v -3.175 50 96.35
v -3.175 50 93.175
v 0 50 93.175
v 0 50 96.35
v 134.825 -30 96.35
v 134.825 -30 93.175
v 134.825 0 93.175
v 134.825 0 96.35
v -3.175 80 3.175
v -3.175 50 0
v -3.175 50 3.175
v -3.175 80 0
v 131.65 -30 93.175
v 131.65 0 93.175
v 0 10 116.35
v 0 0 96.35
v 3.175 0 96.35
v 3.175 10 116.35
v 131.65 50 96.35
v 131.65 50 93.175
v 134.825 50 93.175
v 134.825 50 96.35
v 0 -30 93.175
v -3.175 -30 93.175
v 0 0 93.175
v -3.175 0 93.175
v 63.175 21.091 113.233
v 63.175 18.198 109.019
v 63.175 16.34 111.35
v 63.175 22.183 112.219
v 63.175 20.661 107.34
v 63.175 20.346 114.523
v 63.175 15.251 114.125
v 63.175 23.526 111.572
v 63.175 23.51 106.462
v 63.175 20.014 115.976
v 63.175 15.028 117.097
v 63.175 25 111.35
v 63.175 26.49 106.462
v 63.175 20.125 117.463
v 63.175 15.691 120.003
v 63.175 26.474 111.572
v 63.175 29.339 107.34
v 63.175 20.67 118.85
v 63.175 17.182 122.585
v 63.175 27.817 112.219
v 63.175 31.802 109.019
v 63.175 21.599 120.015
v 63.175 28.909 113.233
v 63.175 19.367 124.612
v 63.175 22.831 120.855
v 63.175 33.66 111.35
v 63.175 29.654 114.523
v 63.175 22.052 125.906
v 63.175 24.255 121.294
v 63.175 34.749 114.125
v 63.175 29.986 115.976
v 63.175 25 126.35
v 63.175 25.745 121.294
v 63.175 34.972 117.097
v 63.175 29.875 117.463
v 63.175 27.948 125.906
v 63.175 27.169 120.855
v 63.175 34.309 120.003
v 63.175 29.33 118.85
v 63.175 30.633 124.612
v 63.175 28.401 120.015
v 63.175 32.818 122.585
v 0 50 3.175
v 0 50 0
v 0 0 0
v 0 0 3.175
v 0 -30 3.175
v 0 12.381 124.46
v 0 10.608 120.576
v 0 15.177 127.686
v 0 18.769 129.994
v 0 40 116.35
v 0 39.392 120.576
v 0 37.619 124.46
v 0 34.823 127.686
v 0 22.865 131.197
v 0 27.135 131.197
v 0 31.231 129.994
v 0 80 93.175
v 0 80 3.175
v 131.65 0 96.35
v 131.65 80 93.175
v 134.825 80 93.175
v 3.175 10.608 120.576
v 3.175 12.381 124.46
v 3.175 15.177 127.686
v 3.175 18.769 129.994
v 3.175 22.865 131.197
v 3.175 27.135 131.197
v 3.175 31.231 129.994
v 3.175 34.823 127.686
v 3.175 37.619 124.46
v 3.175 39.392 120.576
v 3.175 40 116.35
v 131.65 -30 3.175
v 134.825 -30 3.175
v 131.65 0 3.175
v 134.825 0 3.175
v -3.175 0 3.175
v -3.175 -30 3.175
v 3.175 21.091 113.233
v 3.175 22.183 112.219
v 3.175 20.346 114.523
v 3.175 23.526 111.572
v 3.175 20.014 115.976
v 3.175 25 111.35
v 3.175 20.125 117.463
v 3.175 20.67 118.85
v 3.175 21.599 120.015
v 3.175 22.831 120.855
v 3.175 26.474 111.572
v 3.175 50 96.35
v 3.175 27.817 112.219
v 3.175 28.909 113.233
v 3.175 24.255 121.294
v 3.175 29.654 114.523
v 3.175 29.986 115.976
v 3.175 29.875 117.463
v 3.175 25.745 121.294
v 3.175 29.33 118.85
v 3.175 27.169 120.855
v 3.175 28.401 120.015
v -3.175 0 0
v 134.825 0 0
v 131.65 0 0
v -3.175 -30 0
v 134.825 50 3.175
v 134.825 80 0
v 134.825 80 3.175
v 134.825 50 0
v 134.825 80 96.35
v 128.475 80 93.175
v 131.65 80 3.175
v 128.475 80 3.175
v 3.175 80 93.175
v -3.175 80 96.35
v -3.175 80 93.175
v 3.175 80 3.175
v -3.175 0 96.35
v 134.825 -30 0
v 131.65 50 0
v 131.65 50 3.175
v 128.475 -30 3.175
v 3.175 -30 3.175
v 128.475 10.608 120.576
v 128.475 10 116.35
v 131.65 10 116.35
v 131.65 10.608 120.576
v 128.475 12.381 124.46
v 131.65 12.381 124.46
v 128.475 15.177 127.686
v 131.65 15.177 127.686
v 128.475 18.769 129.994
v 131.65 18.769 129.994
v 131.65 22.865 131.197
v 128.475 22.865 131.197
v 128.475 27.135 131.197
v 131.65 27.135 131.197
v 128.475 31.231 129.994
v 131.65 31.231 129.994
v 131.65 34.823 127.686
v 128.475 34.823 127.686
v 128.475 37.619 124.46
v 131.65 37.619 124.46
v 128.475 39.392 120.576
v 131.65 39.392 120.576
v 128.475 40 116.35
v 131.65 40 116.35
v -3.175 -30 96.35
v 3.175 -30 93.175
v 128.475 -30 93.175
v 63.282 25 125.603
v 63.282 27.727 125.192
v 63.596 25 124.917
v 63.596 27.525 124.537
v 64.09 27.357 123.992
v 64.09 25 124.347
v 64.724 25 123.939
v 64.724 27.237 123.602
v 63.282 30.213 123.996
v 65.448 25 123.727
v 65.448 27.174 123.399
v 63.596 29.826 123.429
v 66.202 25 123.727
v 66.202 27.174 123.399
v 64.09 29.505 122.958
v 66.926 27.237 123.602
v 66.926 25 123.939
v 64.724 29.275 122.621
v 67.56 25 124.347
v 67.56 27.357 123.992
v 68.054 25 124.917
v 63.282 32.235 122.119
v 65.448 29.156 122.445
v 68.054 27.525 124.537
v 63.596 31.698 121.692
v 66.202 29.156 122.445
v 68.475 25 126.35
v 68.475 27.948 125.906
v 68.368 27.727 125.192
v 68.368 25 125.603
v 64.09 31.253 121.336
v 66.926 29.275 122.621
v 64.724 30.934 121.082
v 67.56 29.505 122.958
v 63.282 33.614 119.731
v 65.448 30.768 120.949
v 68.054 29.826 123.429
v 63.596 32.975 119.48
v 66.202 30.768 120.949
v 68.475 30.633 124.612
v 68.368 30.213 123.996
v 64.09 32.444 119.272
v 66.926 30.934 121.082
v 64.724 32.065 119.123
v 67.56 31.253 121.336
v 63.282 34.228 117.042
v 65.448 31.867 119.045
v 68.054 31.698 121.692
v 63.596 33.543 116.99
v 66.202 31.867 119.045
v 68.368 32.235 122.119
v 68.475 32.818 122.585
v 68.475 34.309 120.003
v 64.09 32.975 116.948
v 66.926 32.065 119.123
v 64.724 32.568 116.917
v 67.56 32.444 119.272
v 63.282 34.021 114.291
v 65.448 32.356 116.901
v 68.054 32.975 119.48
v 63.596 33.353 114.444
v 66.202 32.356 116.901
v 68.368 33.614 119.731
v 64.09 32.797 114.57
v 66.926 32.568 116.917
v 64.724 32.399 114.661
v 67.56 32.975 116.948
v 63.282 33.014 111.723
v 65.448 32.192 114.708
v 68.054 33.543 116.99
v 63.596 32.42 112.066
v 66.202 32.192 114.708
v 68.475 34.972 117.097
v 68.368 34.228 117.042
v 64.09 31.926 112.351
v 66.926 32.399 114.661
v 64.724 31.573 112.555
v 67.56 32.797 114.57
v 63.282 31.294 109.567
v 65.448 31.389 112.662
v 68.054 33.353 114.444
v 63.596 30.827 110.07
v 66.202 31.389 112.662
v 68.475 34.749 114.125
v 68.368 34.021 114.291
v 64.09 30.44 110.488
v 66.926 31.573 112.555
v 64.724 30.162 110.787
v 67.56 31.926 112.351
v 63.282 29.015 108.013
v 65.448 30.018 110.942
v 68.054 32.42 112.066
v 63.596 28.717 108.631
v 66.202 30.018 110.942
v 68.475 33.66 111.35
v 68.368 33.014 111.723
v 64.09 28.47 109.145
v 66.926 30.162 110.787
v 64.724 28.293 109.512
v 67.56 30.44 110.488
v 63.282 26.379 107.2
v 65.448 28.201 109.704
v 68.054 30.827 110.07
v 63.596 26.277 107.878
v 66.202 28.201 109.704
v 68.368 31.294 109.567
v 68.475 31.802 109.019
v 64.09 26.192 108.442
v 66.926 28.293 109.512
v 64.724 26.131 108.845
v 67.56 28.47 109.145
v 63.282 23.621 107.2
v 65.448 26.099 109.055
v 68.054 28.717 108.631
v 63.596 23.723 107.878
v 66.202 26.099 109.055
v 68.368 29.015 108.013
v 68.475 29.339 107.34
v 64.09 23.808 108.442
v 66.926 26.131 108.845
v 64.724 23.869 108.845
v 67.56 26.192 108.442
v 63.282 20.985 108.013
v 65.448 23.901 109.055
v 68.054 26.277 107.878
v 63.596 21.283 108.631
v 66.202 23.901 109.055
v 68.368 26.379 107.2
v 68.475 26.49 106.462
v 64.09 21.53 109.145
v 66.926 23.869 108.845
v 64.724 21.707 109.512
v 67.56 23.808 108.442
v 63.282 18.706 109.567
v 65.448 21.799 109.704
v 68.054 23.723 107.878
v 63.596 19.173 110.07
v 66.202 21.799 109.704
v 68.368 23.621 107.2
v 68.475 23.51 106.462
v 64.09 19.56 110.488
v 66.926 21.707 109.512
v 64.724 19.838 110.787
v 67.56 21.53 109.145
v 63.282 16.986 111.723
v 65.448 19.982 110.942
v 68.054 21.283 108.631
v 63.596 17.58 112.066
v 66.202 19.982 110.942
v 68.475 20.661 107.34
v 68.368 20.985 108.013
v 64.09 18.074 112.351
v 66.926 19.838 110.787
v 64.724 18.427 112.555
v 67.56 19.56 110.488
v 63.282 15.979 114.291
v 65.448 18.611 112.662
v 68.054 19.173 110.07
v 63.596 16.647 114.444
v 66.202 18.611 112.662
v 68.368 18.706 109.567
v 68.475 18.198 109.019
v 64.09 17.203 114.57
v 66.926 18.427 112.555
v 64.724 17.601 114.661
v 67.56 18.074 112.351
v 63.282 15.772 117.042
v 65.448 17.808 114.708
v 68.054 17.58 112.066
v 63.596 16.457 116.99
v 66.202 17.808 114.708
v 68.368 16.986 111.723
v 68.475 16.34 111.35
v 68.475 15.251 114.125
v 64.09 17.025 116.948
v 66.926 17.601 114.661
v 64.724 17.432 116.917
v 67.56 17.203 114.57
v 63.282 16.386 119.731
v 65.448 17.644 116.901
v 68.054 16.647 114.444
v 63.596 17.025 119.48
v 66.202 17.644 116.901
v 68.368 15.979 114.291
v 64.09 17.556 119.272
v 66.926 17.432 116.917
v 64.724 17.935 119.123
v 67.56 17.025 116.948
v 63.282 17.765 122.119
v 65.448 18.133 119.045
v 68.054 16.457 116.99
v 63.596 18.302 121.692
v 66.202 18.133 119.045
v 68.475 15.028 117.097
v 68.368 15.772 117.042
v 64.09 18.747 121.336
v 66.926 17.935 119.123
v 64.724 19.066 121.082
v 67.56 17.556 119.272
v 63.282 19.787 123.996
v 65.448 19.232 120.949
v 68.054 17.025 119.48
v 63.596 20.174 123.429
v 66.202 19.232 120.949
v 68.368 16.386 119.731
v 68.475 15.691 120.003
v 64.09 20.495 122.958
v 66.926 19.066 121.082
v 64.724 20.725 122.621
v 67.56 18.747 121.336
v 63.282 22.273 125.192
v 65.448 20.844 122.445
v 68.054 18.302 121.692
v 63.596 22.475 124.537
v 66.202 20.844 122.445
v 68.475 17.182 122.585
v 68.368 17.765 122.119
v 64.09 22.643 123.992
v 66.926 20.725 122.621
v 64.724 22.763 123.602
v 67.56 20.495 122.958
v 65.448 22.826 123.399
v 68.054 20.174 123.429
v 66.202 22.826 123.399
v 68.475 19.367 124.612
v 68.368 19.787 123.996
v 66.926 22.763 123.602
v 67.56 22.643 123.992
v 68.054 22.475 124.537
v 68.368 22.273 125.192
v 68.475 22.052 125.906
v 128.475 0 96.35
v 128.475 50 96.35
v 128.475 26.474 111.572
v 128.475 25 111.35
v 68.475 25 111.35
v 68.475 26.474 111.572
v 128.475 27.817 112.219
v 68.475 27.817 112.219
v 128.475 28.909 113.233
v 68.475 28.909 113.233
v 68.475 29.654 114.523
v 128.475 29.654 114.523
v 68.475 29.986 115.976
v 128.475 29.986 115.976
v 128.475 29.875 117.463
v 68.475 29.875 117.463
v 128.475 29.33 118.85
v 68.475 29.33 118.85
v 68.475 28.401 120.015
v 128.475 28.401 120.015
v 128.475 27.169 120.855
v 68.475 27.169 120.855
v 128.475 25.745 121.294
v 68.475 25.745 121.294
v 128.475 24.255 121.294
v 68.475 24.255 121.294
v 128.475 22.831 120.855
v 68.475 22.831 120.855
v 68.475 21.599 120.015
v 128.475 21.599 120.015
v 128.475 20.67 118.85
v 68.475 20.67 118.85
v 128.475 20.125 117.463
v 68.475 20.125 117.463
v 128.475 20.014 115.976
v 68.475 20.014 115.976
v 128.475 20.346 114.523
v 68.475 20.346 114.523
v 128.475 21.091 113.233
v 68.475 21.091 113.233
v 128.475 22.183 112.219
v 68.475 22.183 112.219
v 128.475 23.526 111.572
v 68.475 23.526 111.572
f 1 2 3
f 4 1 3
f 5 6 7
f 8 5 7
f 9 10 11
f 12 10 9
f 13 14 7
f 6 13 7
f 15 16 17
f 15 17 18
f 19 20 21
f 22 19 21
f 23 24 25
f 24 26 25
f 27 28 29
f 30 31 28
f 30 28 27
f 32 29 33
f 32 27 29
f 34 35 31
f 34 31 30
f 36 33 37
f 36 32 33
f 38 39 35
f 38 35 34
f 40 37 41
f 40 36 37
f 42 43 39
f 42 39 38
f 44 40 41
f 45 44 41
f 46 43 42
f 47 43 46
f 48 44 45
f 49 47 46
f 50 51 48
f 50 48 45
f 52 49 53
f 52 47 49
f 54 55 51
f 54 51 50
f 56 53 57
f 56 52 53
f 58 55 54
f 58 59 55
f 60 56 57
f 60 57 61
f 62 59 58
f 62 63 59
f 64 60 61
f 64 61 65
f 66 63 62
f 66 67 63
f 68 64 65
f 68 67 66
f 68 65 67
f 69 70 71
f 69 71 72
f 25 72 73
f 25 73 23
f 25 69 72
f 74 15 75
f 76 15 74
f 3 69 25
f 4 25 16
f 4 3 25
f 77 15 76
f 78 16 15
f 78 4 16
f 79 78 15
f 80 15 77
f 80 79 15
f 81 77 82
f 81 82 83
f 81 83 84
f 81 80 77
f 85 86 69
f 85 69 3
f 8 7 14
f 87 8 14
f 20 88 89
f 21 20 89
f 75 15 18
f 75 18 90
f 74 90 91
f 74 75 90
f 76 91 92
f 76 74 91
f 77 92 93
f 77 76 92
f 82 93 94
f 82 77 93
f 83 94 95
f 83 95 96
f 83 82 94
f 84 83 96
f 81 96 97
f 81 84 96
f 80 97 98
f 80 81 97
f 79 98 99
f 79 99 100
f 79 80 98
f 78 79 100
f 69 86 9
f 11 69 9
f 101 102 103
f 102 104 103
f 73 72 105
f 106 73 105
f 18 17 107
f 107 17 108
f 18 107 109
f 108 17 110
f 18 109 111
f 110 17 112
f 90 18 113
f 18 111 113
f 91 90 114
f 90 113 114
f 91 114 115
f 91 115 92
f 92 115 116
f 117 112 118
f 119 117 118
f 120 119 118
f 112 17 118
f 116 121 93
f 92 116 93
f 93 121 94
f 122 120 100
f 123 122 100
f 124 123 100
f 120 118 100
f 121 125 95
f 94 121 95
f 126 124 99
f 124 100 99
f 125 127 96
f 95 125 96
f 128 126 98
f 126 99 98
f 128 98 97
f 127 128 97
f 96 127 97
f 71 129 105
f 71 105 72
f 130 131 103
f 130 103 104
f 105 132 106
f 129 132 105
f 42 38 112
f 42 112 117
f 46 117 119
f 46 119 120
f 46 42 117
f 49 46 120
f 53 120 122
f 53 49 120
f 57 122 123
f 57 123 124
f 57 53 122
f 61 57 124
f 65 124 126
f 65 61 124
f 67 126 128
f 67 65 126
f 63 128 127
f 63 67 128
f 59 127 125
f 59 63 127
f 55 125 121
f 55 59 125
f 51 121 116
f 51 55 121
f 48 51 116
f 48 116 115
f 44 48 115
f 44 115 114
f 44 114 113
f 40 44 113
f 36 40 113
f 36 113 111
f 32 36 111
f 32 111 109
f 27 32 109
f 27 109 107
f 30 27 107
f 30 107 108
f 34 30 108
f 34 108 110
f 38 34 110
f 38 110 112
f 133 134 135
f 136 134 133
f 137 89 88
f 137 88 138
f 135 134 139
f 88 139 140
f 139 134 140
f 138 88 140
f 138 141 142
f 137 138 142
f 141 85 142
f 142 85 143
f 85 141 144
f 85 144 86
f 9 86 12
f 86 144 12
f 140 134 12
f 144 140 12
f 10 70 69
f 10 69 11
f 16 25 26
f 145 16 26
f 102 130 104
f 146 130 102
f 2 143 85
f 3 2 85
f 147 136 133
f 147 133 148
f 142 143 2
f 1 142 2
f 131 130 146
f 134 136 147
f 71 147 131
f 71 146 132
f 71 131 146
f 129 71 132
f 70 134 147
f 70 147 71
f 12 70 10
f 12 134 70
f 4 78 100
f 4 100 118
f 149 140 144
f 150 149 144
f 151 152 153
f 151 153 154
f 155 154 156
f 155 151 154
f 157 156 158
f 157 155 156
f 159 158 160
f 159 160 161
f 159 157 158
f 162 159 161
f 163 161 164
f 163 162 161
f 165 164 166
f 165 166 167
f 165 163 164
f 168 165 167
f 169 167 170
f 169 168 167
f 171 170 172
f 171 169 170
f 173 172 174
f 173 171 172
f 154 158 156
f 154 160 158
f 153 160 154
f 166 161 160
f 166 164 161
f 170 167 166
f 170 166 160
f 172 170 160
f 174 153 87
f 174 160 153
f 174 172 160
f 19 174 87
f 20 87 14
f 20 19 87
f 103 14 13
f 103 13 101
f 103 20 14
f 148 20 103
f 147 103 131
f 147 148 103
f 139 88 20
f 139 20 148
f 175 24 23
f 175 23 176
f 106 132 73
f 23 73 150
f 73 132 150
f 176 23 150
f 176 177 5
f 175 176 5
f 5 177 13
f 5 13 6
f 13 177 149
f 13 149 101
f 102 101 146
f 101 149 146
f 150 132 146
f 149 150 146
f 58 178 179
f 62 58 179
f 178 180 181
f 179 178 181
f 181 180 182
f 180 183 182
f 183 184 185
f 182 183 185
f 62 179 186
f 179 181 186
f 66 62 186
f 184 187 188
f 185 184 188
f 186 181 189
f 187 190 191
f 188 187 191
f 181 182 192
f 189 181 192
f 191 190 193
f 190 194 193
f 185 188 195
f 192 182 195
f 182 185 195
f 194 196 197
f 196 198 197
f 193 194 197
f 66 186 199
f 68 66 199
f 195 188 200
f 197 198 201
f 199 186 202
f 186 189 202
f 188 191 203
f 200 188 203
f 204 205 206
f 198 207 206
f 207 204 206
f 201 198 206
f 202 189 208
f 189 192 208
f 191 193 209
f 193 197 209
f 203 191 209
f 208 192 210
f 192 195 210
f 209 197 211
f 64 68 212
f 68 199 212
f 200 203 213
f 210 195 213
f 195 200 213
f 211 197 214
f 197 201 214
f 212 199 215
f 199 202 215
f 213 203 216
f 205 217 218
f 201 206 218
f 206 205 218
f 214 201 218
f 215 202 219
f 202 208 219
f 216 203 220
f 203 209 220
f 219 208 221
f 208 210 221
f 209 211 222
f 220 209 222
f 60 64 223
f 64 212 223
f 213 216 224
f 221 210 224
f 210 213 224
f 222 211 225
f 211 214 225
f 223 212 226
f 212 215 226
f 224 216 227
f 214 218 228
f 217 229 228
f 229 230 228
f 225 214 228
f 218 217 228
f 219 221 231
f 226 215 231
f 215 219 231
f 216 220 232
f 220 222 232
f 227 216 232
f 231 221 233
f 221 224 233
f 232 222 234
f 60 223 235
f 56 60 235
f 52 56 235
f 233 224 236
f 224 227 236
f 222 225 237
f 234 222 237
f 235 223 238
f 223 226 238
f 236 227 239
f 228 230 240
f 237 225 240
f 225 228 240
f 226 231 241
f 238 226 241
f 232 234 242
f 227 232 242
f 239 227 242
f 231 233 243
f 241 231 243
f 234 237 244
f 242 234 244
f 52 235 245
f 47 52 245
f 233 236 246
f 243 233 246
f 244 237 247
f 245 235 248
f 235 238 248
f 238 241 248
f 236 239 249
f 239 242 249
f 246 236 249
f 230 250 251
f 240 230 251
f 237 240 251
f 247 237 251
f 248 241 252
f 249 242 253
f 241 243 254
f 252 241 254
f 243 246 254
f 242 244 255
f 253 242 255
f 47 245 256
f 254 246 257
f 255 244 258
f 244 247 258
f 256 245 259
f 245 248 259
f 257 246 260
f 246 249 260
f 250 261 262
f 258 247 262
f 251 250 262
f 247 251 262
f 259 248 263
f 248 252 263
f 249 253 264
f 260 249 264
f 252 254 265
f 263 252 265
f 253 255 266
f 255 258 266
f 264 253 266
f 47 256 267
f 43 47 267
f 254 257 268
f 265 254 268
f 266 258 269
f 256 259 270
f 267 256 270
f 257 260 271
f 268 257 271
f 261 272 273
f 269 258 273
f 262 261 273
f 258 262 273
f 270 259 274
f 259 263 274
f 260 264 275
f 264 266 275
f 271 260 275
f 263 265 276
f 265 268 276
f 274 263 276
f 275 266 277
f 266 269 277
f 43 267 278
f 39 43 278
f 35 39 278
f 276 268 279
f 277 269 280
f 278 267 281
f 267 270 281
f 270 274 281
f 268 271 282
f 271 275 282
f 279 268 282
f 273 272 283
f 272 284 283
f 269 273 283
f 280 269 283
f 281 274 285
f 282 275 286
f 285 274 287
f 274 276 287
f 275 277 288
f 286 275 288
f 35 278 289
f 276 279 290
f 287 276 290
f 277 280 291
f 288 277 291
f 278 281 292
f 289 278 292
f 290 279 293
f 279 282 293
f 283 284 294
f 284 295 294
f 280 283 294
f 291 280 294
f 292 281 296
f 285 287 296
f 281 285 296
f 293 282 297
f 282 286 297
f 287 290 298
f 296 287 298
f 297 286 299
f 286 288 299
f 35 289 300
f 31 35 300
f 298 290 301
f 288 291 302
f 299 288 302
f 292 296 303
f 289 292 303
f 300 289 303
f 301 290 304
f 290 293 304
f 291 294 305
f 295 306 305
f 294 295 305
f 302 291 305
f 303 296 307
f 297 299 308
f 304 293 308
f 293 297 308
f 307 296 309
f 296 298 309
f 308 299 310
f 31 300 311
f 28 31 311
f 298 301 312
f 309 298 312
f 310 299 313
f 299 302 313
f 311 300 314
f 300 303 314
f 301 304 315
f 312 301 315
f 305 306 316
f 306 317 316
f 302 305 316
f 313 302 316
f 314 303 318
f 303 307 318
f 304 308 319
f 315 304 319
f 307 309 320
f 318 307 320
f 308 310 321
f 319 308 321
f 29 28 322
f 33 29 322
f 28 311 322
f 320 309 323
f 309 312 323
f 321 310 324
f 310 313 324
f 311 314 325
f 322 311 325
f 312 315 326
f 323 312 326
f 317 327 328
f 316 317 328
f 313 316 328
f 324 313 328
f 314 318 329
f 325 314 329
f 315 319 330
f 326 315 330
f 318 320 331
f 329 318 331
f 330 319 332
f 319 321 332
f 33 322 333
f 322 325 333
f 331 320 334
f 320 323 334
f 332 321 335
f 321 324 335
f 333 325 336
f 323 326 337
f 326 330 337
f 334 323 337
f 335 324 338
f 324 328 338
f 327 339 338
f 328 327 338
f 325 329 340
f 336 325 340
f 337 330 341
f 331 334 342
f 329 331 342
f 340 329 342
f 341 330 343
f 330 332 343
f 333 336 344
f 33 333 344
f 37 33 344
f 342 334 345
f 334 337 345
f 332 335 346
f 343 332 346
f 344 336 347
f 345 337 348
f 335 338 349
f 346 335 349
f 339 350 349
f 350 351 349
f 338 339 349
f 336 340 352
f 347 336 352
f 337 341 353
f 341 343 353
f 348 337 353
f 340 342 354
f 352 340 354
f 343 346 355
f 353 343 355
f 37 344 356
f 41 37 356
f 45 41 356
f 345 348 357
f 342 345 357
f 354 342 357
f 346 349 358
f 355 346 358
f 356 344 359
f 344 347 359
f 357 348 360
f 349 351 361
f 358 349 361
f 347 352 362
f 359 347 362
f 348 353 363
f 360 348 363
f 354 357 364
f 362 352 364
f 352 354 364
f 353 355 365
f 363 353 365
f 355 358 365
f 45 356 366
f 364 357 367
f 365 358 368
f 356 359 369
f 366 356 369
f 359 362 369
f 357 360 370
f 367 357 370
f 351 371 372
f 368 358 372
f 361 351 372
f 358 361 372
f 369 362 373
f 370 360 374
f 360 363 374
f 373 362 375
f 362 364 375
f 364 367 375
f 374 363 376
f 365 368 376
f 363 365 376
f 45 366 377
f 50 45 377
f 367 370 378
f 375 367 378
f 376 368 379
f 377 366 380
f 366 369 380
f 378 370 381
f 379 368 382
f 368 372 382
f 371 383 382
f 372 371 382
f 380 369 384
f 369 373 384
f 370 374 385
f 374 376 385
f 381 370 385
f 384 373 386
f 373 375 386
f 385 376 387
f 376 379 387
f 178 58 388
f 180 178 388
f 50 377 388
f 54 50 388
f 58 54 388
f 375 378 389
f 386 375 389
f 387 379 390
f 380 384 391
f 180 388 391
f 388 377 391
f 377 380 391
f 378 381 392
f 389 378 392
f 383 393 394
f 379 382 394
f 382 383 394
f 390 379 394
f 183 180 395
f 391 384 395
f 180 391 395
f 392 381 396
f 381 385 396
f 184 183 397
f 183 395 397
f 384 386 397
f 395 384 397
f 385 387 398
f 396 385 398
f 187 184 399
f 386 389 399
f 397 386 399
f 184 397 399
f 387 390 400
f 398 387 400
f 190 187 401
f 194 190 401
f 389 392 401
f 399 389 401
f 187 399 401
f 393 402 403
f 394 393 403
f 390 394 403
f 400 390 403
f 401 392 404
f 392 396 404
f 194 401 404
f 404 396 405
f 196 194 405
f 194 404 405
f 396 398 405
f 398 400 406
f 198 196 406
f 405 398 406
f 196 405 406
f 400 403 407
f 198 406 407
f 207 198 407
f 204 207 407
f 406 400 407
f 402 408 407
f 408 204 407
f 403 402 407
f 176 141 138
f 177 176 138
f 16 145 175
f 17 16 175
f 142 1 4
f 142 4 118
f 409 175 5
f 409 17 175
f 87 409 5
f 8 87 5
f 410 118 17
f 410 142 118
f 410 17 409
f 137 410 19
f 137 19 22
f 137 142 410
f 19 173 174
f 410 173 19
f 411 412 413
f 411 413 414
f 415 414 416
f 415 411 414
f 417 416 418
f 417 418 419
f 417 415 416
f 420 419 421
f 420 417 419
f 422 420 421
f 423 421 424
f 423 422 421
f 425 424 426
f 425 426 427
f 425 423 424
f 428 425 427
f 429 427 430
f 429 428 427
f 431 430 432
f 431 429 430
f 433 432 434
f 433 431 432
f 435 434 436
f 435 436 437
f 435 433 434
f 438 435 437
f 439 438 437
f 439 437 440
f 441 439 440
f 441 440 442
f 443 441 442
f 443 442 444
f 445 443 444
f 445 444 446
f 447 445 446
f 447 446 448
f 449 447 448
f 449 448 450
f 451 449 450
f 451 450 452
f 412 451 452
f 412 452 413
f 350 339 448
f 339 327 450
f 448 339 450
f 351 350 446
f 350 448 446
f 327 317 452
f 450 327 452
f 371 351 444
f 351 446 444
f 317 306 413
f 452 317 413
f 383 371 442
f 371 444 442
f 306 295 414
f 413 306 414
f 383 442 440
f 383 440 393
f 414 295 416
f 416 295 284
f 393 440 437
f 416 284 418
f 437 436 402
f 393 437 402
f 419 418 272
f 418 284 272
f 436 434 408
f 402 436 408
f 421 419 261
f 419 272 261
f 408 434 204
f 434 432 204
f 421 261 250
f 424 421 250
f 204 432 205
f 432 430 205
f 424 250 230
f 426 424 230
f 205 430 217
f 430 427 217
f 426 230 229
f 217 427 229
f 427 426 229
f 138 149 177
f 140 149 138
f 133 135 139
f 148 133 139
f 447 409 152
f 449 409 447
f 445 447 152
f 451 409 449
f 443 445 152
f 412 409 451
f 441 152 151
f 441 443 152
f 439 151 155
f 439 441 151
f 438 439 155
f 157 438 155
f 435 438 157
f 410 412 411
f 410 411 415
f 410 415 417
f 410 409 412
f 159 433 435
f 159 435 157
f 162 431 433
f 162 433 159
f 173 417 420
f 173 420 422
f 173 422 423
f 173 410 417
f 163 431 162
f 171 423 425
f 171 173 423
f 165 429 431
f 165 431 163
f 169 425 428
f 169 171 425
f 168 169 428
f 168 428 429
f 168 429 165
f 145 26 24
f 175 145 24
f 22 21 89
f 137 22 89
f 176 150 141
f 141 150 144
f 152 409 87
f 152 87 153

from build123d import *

# Parameters (mm, degrees)
BOSS_EXTRUDE1_DEPTH = 3.175
SKETCH3_W           = 3.175
SKETCH3_H           = 110
BOSS_EXTRUDE2_DEPTH = 90
BOSS_EXTRUDE3_DEPTH = 3.175
BOSS_EXTRUDE4_DEPTH = 3.175
BOSS_EXTRUDE5_START = -3.175
BOSS_EXTRUDE5_DEPTH = 3.175
SKETCH7_R           = 5
BOSS_EXTRUDE6_DEPTH = 128.475
SKETCH8_R           = 10
BOSS_EXTRUDE7_DEPTH = 5.3
SKETCH10_R          = 2.65


with BuildPart() as part:
    # Sketch2 → Boss-Extrude1 (new body)
    with BuildSketch(Plane.XY):
        Polygon((0, 50), (-3.175, 50), (-3.175, 80), (134.825, 80), (134.825, 50), (131.65, 50), (131.65, 0), (134.825, 0), (134.825, -30), (-3.175, -30), (-3.175, 0), (0, 0), align=None)
    extrude(amount=BOSS_EXTRUDE1_DEPTH)

    # Sketch3 → Boss-Extrude2 (add)
    with BuildSketch(Plane.XY.offset(3.175)):
        with Locations((1.5875, 25)):
            Rectangle(SKETCH3_W, SKETCH3_H)
        with Locations((130.0625, 25)):
            Rectangle(SKETCH3_W, SKETCH3_H)
    extrude(amount=BOSS_EXTRUDE2_DEPTH)

    # Sketch4 → Boss-Extrude3 (add)
    with BuildSketch(Plane.XY.offset(93.175)):
        Polygon((131.65, 50), (134.825, 50), (134.825, 80), (-3.175, 80), (-3.175, 50), (-1.5875, 50), (0, 50), (0, 0), (-3.175, 0), (-3.175, -30), (134.825, -30), (134.825, 0), (131.65, 0), align=None)
    extrude(amount=BOSS_EXTRUDE3_DEPTH)

    # Sketch5 → Boss-Extrude4 (add)
    with BuildSketch(Plane.ZY):
        with BuildLine():
            Line((96.35, 50), (96.35, 0))
            Line((96.35, 0), (116.35, 10))
            ThreePointArc((116.35, 10), (131.35, 25), (116.35, 40))
            Line((116.35, 40), (96.35, 50))
        make_face()
    extrude(amount=-BOSS_EXTRUDE4_DEPTH)

    # Sketch6 → Boss-Extrude5 (add)
    with BuildSketch(Plane(origin=(131.65, 0, 0), x_dir=(0, 0, -1), z_dir=(1, 0, 0)).offset(BOSS_EXTRUDE5_START)):
        with BuildLine():
            Line((-96.35, 0), (-116.35, 10))
            ThreePointArc((-116.35, 10), (-131.35, 25), (-116.35, 40))
            Line((-116.35, 40), (-96.35, 50))
            Line((-96.35, 50), (-96.35, 0))
        make_face()
    extrude(amount=BOSS_EXTRUDE5_DEPTH)

    # Sketch7 → Boss-Extrude6 (add)
    with BuildSketch(Plane(origin=(131.65, 0, 0), x_dir=(0, 0, -1), z_dir=(1, 0, 0))):
        with Locations((-116.35, 25)):
            Circle(SKETCH7_R)
    extrude(amount=-BOSS_EXTRUDE6_DEPTH)

    # Sketch8 → Boss-Extrude7 (add)
    with BuildSketch(Plane.ZY.offset(-68.475)):
        with Locations((116.35, 25)):
            Circle(SKETCH8_R)
    extrude(amount=BOSS_EXTRUDE7_DEPTH)

    # Sketch10 → Cut-Revolve1 (revolve, cut)
    with BuildSketch(Plane(origin=(0, 25, 0), x_dir=(1, 0, 0), z_dir=(0, 1, 0)), mode=Mode.PRIVATE) as cut_revolve1_sk:
        with Locations((65.825, -106.35)):
            Circle(SKETCH10_R)
    revolve(cut_revolve1_sk.sketch.rotate(Axis((63.175, 25, 116.35), (-1, 0, 0)), 180), axis=Axis((63.175, 25, 116.35), (-1, 0, 0)), mode=Mode.SUBTRACT)


solid = part.part
